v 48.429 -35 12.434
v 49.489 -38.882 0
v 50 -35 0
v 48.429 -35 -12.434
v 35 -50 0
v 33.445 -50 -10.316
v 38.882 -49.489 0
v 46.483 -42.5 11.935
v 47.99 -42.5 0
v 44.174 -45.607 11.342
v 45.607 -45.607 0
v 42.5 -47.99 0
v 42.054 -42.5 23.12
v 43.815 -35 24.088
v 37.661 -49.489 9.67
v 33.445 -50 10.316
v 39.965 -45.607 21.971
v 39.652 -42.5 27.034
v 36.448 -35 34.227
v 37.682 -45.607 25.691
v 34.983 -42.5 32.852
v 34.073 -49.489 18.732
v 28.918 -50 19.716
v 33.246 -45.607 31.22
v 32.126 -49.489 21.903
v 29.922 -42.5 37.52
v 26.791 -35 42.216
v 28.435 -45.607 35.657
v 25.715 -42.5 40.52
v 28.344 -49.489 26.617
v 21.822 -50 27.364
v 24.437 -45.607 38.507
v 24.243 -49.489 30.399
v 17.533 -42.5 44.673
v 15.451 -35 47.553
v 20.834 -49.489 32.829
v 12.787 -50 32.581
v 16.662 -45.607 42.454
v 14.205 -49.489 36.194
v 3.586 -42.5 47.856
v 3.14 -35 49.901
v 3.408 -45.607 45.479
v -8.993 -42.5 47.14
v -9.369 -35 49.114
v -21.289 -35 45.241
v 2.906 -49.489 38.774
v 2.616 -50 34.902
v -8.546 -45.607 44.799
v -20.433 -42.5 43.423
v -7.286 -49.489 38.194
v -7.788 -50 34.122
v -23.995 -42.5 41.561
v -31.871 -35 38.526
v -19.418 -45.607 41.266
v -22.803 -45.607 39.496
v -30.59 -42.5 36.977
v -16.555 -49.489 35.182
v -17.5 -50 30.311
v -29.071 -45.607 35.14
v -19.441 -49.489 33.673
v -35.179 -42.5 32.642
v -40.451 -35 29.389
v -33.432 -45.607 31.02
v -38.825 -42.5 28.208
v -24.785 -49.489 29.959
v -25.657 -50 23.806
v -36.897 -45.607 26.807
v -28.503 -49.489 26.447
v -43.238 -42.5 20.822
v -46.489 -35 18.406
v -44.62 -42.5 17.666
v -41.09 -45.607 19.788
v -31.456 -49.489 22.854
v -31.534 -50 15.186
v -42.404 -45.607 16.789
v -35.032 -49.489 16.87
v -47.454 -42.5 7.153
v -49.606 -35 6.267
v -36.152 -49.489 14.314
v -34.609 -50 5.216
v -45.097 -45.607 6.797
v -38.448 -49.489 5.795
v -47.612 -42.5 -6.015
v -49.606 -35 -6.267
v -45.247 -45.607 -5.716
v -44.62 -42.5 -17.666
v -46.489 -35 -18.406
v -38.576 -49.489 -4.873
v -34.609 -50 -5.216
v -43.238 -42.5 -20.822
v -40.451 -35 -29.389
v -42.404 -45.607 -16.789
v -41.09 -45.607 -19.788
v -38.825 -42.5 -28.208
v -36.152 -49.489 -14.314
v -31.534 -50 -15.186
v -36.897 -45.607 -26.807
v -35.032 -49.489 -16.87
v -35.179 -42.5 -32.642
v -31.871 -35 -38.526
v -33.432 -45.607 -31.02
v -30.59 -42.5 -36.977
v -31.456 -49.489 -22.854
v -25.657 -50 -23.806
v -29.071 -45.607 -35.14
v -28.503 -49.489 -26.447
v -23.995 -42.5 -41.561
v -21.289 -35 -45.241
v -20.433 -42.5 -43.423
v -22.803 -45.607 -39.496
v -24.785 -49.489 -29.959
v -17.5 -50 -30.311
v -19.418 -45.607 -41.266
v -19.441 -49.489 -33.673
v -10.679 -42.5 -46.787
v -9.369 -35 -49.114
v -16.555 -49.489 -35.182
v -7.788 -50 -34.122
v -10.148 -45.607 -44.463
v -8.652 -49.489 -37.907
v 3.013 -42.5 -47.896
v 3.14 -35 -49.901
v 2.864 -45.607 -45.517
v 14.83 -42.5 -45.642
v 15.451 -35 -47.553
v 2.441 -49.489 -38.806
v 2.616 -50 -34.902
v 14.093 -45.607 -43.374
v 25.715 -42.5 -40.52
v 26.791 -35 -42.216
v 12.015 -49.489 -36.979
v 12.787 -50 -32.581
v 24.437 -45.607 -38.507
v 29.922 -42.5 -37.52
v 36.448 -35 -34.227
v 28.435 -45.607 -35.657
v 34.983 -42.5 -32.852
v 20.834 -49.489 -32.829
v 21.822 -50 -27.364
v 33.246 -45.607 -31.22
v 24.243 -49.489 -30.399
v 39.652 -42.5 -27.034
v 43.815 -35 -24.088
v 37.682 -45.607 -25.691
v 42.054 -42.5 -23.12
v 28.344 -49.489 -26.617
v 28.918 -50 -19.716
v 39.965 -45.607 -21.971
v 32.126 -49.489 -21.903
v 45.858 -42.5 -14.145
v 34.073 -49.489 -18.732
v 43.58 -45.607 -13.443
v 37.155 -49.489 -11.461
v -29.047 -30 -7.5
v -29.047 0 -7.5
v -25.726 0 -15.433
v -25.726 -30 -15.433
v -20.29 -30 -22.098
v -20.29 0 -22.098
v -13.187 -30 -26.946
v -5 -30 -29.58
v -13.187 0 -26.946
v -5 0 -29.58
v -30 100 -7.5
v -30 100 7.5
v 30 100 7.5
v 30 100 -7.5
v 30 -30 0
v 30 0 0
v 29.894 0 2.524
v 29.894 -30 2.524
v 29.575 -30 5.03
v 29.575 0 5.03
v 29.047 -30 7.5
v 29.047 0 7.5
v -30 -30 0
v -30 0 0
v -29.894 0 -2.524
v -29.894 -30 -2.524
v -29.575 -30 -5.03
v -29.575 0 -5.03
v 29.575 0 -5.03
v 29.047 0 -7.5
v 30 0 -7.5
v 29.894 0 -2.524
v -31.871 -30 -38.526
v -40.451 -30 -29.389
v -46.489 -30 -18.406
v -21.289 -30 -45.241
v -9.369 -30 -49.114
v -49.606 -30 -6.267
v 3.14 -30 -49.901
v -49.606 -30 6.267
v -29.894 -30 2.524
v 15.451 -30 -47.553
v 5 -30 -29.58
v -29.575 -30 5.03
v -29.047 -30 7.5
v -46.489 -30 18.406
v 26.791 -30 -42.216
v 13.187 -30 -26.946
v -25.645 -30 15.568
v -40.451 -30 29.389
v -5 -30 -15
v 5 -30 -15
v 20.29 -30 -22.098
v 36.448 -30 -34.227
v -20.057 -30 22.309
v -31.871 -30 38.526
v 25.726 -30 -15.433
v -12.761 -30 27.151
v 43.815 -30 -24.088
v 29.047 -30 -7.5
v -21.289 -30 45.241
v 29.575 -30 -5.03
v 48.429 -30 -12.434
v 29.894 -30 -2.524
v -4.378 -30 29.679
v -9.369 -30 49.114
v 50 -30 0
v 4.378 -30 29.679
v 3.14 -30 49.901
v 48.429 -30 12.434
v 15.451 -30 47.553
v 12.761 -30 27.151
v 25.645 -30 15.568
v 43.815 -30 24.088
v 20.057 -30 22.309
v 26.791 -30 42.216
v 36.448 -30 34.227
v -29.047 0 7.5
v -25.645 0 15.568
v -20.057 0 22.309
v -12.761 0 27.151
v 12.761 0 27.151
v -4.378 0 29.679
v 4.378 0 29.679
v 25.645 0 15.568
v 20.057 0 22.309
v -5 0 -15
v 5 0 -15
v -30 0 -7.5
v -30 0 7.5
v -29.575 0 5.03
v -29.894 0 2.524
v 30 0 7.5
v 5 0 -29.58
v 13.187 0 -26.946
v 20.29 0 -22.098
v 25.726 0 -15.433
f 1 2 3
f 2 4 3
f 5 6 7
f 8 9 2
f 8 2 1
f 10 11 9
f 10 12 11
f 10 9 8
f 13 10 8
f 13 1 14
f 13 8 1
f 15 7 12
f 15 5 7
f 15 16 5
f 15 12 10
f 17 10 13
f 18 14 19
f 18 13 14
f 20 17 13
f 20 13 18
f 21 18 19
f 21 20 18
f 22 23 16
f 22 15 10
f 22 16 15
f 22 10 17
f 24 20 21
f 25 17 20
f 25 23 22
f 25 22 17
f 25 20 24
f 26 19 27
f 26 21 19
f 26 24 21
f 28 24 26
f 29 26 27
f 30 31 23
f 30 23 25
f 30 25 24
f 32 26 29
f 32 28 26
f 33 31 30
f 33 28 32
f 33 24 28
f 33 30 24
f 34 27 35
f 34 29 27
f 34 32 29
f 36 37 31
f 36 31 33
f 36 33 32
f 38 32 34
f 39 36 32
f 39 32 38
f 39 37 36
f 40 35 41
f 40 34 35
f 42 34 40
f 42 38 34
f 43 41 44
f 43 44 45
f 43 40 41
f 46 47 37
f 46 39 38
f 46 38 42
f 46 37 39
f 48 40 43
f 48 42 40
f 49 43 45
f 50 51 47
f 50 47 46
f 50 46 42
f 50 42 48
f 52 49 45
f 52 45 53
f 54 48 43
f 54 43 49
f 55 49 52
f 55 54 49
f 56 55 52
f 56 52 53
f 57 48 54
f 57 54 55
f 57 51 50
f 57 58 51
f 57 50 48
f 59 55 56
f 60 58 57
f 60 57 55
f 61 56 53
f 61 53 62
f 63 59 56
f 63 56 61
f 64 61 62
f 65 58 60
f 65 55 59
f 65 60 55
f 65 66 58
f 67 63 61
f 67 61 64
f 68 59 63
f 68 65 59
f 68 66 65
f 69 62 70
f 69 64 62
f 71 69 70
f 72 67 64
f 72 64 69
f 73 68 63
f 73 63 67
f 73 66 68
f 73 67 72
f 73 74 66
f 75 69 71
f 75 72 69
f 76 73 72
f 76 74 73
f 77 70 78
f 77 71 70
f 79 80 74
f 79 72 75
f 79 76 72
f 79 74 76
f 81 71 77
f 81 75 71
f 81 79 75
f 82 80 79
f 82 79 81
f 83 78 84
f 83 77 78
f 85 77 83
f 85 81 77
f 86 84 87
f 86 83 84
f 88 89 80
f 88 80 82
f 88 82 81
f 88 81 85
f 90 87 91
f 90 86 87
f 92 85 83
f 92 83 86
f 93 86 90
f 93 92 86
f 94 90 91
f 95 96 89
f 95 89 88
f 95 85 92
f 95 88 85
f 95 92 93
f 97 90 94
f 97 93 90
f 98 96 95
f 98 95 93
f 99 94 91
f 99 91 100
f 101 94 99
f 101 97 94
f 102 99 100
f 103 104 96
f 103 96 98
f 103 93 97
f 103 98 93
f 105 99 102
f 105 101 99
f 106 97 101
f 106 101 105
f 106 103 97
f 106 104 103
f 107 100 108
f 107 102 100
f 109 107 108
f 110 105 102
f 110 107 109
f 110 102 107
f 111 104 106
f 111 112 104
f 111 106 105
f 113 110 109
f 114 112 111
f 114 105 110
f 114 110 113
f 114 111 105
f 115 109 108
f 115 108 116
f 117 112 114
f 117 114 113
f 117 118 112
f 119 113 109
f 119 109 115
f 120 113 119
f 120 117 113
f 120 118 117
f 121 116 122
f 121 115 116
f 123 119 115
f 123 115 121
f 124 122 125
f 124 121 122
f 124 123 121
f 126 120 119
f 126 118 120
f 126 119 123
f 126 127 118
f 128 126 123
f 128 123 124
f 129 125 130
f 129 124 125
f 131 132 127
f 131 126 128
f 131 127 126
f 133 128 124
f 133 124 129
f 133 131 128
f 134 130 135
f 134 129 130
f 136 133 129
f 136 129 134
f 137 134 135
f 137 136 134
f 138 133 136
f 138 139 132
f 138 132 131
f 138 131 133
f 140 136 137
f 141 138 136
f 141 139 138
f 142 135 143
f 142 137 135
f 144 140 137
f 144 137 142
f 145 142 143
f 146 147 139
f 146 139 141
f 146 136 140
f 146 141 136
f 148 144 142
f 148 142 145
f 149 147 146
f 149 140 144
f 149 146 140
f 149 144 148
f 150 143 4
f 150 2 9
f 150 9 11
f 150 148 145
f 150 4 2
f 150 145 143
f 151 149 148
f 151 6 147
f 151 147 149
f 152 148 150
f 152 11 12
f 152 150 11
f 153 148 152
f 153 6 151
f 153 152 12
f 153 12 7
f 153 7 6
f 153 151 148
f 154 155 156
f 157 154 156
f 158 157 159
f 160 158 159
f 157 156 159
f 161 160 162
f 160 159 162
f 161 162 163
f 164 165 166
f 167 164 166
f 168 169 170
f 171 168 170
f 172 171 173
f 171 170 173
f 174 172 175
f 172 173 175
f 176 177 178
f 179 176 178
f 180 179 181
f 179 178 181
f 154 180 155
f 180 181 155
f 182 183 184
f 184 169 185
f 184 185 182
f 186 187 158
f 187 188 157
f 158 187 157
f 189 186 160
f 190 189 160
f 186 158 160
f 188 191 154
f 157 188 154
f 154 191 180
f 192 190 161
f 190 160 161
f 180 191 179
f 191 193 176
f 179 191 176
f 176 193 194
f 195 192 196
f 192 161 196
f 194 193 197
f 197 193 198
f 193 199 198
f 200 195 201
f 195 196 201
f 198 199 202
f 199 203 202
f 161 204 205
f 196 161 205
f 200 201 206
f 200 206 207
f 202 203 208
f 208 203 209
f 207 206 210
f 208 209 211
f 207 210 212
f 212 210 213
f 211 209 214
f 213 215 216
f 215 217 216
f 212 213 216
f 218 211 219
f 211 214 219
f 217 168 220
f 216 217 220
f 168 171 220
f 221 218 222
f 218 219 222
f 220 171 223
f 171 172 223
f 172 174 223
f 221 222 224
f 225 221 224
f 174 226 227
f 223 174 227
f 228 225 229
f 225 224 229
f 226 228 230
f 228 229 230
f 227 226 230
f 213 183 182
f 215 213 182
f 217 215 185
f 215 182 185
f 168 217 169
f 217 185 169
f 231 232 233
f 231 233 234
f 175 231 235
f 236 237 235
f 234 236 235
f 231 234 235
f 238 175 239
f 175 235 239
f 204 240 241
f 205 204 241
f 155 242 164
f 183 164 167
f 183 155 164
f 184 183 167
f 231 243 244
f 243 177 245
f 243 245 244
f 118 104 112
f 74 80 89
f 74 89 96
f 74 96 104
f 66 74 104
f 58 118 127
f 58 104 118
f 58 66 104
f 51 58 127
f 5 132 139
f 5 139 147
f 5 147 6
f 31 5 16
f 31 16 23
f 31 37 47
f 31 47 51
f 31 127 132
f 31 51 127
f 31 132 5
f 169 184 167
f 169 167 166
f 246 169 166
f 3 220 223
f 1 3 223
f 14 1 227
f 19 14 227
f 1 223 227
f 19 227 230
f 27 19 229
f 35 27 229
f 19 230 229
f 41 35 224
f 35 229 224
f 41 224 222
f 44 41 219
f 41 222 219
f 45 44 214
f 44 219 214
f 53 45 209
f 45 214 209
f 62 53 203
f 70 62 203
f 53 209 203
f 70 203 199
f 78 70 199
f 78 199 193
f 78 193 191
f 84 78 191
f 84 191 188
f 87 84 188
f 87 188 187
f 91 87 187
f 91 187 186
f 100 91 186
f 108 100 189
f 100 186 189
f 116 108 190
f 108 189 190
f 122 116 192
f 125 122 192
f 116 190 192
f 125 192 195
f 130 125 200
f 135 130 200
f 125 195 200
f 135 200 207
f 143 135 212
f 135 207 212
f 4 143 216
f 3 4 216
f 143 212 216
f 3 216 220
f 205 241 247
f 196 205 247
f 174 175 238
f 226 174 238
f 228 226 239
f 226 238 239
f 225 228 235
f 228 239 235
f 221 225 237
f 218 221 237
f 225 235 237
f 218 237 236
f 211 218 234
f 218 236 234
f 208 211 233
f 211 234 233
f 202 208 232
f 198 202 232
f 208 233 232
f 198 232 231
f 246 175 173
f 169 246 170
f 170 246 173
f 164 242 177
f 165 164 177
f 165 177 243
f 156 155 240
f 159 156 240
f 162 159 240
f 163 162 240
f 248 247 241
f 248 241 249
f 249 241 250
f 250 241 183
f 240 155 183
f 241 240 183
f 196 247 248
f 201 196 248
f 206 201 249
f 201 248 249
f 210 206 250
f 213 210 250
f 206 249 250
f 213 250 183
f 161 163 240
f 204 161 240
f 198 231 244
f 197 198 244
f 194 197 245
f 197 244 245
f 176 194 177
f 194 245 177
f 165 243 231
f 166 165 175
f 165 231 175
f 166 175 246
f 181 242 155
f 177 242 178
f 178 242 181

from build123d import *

# Parameters (mm, degrees)
F0_W     = 60
F0_H     = 15
F1_DEPTH = 100
F3_DEPTH = 30
F4_R     = 50
F4_R_2   = 30
F5_DEPTH = 20
F6_R     = 15
F8_DEPTH = 30


# Not quite as in the source:
# - a feature names something its author has since deleted; it is built from what else it names


with BuildPart() as f1:
    # F0 (on Front) → F1 (new body)
    with BuildSketch(Plane.XZ):
        Rectangle(F0_W, F0_H)
    extrude(amount=-F1_DEPTH)

    # F2 (on face) → F3 (join)
    with BuildSketch(Plane.XZ):
        with BuildLine():
            ThreePointArc((29.0473750966, -7.5), (29.760890888, -3.7801287745), (30, 0))
            ThreePointArc((30, 0), (29.760890888, 3.7801287745), (29.0473750966, 7.5))
            Line((29.0473750966, 7.5), (-29.0473750966, 7.5))
            ThreePointArc((-29.0473750966, 7.5), (-29.760890888, 3.7801287745), (-30, 0))
            ThreePointArc((-30, 0), (-29.760890888, -3.7801287745), (-29.0473750966, -7.5))
            Line((-29.0473750966, -7.5), (29.0473750966, -7.5))
        make_face()
        with BuildLine():
            Line((-29.0473750966, 7.5), (29.0473750966, 7.5))
            ThreePointArc((29.0473750966, 7.5), (0, 30), (-29.0473750966, 7.5))
        make_face()
        with BuildLine():
            ThreePointArc((-29.0473750966, -7.5), (0, -30), (29.0473750966, -7.5))
            Line((29.0473750966, -7.5), (-29.0473750966, -7.5))
        make_face()
    extrude(amount=F3_DEPTH)

    # F4 (on face) → F5 (join)
    with BuildSketch(Plane.XZ.offset(30)):
        Circle(F4_R)
        Circle(F4_R_2, mode=Mode.SUBTRACT)
        Circle(F4_R_2)
    extrude(amount=F5_DEPTH)

    # F6
    f6_edges = [f1.edges().sort_by_distance(p)[0] for p in [
        (-50, -50, 0),
    ]]
    fillet(f6_edges, radius=F6_R)

    # F7 (on face) → F8 (cut)
    with BuildSketch(Plane(origin=(0, 0, 0), x_dir=(-1, 0, 0), z_dir=(0, 1, 0))):
        with BuildLine():
            Line((5, -15), (-5, -15))
            Line((-5, -15), (-5, -29.5803989155))
            ThreePointArc((-5, -29.5803989155), (0, -30), (5, -29.5803989155))
            Line((5, -29.5803989155), (5, -15))
        make_face()
    extrude(amount=-F8_DEPTH, mode=Mode.SUBTRACT)


solid = f1.part
